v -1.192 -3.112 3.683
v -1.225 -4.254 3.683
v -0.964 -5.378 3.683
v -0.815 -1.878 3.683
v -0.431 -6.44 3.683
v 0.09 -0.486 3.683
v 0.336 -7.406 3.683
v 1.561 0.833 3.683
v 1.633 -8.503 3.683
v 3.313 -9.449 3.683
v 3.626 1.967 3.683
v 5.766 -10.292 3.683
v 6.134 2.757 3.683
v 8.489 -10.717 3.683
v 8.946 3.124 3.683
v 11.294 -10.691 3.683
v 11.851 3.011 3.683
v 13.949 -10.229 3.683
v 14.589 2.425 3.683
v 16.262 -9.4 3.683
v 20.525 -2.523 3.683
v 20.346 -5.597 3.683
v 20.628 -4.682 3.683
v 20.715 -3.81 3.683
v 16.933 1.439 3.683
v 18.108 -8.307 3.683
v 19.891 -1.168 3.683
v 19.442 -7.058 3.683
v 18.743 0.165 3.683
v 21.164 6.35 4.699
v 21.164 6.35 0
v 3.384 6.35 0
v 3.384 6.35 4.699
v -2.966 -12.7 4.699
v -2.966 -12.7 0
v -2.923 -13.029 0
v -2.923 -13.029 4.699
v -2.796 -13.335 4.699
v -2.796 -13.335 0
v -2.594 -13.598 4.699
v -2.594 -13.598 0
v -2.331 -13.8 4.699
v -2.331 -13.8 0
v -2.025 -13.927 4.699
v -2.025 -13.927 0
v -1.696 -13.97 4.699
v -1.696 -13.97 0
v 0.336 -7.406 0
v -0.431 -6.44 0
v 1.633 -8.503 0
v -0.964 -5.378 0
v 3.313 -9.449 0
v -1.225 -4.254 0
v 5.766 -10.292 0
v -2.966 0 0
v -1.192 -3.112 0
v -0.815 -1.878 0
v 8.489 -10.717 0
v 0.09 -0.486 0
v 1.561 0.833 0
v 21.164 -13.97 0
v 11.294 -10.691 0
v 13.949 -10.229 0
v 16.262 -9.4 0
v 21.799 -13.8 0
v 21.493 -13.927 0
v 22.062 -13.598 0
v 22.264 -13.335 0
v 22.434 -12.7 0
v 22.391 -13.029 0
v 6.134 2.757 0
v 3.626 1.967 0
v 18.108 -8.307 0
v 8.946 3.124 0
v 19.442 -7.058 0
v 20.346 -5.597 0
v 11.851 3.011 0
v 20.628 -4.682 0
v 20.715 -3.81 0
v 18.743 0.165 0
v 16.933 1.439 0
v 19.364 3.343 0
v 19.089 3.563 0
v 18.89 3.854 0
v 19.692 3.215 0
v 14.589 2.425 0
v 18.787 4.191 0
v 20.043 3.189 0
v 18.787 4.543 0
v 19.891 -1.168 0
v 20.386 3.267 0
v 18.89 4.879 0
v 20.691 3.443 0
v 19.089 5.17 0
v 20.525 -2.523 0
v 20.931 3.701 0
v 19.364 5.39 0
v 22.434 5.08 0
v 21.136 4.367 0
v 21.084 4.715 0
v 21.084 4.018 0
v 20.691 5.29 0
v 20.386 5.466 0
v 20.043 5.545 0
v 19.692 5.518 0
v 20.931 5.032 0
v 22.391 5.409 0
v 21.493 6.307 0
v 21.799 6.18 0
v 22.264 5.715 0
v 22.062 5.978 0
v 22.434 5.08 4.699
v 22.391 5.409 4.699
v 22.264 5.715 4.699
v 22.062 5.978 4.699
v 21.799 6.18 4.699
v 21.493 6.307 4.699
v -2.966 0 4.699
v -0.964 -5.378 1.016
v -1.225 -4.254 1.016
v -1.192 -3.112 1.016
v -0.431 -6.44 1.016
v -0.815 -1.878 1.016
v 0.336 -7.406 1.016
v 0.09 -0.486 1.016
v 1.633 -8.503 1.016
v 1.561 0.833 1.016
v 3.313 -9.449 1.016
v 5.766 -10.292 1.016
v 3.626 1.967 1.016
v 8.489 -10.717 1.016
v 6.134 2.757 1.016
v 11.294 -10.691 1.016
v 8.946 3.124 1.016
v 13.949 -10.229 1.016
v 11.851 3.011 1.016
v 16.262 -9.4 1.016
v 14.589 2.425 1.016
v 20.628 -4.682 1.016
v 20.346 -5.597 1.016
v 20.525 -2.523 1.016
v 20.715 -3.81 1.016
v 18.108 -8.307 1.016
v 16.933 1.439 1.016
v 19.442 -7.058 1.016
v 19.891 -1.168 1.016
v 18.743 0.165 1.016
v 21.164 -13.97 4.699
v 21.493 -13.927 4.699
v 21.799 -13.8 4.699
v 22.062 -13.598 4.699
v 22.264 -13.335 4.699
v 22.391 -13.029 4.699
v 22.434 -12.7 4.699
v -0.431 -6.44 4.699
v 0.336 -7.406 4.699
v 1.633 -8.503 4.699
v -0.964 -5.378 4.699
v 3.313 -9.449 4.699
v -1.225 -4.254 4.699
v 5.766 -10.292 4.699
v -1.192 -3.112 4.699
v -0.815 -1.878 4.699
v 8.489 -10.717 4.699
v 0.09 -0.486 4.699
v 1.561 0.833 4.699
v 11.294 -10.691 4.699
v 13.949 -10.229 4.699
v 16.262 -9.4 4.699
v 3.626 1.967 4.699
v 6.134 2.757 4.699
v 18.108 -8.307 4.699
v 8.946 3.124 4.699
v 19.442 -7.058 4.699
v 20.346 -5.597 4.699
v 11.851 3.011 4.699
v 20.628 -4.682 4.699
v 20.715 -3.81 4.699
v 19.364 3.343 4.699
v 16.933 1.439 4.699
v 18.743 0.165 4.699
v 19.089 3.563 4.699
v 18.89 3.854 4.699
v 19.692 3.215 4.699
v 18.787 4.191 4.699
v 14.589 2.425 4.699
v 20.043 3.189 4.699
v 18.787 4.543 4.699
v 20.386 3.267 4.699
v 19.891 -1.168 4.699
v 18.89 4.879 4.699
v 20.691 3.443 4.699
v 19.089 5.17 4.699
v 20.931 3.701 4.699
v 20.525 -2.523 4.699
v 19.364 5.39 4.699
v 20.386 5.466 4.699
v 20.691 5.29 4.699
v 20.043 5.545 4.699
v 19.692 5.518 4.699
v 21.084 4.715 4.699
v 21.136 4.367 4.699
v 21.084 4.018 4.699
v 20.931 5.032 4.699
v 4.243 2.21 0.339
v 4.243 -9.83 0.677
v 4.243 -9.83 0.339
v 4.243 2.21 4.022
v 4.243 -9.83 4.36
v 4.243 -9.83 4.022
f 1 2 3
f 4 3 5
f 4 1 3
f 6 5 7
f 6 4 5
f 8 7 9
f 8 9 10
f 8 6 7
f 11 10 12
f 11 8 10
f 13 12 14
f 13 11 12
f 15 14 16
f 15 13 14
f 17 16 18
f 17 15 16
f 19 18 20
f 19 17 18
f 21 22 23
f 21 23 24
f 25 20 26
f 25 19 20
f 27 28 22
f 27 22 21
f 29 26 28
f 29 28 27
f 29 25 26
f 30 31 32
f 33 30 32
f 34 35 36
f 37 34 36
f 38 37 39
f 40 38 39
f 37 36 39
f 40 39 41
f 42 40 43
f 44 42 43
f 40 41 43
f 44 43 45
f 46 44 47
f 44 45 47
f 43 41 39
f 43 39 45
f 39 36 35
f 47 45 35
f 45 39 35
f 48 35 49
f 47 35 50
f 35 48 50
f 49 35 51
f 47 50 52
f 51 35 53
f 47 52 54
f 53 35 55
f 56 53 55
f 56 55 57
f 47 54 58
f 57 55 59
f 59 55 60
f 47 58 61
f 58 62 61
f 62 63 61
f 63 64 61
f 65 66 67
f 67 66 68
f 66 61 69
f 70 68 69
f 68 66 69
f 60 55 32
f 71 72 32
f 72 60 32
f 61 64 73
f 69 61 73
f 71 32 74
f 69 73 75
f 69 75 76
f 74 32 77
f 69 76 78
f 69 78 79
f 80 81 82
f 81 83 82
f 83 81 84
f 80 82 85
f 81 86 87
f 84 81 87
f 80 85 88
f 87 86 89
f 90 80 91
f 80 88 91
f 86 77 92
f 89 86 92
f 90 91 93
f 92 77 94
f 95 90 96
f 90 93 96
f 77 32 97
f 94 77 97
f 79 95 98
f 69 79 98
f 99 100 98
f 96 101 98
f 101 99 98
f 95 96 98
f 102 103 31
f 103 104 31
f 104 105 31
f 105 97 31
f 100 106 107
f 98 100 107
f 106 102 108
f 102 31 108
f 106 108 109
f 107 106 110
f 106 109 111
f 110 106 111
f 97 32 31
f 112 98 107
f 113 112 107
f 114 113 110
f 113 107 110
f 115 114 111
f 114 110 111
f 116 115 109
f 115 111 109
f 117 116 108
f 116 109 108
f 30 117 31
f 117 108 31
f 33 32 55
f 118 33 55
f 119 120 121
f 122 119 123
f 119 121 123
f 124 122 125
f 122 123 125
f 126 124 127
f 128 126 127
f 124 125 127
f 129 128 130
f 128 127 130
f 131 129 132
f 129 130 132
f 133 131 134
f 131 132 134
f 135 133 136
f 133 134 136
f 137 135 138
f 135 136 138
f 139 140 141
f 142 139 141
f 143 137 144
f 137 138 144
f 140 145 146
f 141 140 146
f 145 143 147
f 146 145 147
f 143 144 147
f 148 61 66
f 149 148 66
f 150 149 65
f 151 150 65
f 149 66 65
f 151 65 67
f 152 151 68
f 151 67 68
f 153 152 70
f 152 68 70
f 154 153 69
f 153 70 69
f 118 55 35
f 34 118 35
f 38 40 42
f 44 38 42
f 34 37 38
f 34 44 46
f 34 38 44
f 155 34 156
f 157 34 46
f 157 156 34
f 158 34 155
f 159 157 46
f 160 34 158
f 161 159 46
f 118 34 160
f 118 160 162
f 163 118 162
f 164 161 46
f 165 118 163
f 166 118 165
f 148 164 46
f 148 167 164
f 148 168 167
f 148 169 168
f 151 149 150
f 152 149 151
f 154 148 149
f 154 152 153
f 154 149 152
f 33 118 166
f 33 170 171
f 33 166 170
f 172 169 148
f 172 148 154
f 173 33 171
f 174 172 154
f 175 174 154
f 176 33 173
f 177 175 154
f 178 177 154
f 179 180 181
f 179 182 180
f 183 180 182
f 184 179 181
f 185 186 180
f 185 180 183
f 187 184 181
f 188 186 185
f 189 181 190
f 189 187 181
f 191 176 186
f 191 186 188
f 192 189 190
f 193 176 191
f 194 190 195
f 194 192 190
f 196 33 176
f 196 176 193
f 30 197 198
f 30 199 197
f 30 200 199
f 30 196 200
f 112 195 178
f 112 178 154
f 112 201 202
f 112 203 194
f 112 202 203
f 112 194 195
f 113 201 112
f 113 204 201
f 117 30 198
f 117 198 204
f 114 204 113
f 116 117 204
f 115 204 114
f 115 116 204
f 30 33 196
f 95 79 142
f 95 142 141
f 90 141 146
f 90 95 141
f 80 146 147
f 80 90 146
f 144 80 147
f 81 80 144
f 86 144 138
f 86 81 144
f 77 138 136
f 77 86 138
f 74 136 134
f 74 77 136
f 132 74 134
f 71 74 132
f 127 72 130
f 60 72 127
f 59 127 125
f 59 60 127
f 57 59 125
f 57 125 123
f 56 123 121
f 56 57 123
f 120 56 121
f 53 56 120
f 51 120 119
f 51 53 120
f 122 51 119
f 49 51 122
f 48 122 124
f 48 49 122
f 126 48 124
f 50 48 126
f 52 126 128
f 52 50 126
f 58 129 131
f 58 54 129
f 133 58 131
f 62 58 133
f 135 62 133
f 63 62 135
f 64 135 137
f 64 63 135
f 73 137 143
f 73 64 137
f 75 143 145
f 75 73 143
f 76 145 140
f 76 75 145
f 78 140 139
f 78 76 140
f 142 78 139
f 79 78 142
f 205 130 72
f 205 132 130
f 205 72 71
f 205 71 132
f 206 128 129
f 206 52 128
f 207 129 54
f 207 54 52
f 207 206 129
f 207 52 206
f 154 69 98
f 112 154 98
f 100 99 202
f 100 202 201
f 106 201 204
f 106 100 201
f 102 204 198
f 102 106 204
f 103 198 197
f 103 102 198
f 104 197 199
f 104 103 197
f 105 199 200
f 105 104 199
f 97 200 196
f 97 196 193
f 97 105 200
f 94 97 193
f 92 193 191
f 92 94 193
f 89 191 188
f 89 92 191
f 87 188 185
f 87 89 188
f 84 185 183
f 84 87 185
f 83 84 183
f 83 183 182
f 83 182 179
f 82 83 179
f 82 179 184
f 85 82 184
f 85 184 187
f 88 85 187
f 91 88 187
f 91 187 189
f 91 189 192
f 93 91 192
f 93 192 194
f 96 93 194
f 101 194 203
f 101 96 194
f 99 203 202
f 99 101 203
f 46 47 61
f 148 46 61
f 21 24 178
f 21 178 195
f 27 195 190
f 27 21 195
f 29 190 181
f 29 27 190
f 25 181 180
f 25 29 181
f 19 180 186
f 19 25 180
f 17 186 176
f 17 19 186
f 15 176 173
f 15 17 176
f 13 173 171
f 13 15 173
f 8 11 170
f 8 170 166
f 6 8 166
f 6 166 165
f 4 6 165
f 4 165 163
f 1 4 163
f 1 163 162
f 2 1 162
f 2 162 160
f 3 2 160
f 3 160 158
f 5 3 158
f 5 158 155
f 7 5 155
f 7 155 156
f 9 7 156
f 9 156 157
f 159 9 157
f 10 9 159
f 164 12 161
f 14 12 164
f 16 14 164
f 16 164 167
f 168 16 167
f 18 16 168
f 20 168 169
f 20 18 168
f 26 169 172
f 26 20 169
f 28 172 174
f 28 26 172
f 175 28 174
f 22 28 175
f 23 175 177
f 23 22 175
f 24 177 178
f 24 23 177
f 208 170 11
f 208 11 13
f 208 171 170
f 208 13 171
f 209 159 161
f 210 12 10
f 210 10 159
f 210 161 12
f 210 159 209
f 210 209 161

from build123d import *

# Parameters (mm, degrees)
F0_R     = 1.181384
F1_DEPTH = 4.699
F2_DEPTH = 3.683
F4_DEPTH = 1.016


with BuildPart() as f1:
    # F0 (on Top) → F1 (new body)
    with BuildSketch(Plane.XY):
        with BuildLine():
            ThreePointArc((-2.966018, -12.7), (-2.594043, -13.598026), (-1.696018, -13.97))
            Line((-1.696018, -13.97), (21.163982, -13.97))
            ThreePointArc((21.163982, -13.97), (22.062008, -13.598026), (22.433982, -12.7))
            Line((22.433982, -12.7), (22.433982, 5.08))
            ThreePointArc((22.433982, 5.08), (22.062008, 5.978026), (21.163982, 6.35))
            Line((21.163982, 6.35), (3.383982, 6.35))
            Line((3.383982, 6.35), (-2.966018, 0))
            Line((-2.966018, 0), (-2.966018, -12.7))
        make_face()
        with BuildLine():
            add(Edge.make_bspline(
                [(20.715084, -3.81), (20.715084, 8.230305), (4.243432, 2.210153), (-12.228221, -3.81), (4.243432, -9.830153), (20.715084, -15.850305), (20.715084, -3.81)],
                knots=[0, 0, 0, 2.094395, 2.094395, 4.18879, 4.18879, 6.283185, 6.283185, 6.283185], degree=2, weights=[1, 0.5, 1, 0.5, 1, 0.5, 1]))
        make_face(mode=Mode.SUBTRACT)
        with Locations((19.954724, 4.366593)):
            Circle(F0_R, mode=Mode.SUBTRACT)
    extrude(amount=F1_DEPTH)

    # F0 (on Top) → F2 (join)
    with BuildSketch(Plane.XY):
        with BuildLine():
            add(Edge.make_bspline(
                [(20.715084, -3.81), (20.715084, 8.230305), (4.243432, 2.210153), (-12.228221, -3.81), (4.243432, -9.830153), (20.715084, -15.850305), (20.715084, -3.81)],
                knots=[0, 0, 0, 2.094395, 2.094395, 4.18879, 4.18879, 6.283185, 6.283185, 6.283185], degree=2, weights=[1, 0.5, 1, 0.5, 1, 0.5, 1]))
        make_face()
    extrude(amount=F2_DEPTH)

    # F0 (on Top) → F4 (cut)
    with BuildSketch(Plane.XY):
        with BuildLine():
            add(Edge.make_bspline(
                [(20.715084, -3.81), (20.715084, 8.230305), (4.243432, 2.210153), (-12.228221, -3.81), (4.243432, -9.830153), (20.715084, -15.850305), (20.715084, -3.81)],
                knots=[0, 0, 0, 2.094395, 2.094395, 4.18879, 4.18879, 6.283185, 6.283185, 6.283185], degree=2, weights=[1, 0.5, 1, 0.5, 1, 0.5, 1]))
        make_face()
    extrude(amount=F4_DEPTH, mode=Mode.SUBTRACT)


solid = f1.part
